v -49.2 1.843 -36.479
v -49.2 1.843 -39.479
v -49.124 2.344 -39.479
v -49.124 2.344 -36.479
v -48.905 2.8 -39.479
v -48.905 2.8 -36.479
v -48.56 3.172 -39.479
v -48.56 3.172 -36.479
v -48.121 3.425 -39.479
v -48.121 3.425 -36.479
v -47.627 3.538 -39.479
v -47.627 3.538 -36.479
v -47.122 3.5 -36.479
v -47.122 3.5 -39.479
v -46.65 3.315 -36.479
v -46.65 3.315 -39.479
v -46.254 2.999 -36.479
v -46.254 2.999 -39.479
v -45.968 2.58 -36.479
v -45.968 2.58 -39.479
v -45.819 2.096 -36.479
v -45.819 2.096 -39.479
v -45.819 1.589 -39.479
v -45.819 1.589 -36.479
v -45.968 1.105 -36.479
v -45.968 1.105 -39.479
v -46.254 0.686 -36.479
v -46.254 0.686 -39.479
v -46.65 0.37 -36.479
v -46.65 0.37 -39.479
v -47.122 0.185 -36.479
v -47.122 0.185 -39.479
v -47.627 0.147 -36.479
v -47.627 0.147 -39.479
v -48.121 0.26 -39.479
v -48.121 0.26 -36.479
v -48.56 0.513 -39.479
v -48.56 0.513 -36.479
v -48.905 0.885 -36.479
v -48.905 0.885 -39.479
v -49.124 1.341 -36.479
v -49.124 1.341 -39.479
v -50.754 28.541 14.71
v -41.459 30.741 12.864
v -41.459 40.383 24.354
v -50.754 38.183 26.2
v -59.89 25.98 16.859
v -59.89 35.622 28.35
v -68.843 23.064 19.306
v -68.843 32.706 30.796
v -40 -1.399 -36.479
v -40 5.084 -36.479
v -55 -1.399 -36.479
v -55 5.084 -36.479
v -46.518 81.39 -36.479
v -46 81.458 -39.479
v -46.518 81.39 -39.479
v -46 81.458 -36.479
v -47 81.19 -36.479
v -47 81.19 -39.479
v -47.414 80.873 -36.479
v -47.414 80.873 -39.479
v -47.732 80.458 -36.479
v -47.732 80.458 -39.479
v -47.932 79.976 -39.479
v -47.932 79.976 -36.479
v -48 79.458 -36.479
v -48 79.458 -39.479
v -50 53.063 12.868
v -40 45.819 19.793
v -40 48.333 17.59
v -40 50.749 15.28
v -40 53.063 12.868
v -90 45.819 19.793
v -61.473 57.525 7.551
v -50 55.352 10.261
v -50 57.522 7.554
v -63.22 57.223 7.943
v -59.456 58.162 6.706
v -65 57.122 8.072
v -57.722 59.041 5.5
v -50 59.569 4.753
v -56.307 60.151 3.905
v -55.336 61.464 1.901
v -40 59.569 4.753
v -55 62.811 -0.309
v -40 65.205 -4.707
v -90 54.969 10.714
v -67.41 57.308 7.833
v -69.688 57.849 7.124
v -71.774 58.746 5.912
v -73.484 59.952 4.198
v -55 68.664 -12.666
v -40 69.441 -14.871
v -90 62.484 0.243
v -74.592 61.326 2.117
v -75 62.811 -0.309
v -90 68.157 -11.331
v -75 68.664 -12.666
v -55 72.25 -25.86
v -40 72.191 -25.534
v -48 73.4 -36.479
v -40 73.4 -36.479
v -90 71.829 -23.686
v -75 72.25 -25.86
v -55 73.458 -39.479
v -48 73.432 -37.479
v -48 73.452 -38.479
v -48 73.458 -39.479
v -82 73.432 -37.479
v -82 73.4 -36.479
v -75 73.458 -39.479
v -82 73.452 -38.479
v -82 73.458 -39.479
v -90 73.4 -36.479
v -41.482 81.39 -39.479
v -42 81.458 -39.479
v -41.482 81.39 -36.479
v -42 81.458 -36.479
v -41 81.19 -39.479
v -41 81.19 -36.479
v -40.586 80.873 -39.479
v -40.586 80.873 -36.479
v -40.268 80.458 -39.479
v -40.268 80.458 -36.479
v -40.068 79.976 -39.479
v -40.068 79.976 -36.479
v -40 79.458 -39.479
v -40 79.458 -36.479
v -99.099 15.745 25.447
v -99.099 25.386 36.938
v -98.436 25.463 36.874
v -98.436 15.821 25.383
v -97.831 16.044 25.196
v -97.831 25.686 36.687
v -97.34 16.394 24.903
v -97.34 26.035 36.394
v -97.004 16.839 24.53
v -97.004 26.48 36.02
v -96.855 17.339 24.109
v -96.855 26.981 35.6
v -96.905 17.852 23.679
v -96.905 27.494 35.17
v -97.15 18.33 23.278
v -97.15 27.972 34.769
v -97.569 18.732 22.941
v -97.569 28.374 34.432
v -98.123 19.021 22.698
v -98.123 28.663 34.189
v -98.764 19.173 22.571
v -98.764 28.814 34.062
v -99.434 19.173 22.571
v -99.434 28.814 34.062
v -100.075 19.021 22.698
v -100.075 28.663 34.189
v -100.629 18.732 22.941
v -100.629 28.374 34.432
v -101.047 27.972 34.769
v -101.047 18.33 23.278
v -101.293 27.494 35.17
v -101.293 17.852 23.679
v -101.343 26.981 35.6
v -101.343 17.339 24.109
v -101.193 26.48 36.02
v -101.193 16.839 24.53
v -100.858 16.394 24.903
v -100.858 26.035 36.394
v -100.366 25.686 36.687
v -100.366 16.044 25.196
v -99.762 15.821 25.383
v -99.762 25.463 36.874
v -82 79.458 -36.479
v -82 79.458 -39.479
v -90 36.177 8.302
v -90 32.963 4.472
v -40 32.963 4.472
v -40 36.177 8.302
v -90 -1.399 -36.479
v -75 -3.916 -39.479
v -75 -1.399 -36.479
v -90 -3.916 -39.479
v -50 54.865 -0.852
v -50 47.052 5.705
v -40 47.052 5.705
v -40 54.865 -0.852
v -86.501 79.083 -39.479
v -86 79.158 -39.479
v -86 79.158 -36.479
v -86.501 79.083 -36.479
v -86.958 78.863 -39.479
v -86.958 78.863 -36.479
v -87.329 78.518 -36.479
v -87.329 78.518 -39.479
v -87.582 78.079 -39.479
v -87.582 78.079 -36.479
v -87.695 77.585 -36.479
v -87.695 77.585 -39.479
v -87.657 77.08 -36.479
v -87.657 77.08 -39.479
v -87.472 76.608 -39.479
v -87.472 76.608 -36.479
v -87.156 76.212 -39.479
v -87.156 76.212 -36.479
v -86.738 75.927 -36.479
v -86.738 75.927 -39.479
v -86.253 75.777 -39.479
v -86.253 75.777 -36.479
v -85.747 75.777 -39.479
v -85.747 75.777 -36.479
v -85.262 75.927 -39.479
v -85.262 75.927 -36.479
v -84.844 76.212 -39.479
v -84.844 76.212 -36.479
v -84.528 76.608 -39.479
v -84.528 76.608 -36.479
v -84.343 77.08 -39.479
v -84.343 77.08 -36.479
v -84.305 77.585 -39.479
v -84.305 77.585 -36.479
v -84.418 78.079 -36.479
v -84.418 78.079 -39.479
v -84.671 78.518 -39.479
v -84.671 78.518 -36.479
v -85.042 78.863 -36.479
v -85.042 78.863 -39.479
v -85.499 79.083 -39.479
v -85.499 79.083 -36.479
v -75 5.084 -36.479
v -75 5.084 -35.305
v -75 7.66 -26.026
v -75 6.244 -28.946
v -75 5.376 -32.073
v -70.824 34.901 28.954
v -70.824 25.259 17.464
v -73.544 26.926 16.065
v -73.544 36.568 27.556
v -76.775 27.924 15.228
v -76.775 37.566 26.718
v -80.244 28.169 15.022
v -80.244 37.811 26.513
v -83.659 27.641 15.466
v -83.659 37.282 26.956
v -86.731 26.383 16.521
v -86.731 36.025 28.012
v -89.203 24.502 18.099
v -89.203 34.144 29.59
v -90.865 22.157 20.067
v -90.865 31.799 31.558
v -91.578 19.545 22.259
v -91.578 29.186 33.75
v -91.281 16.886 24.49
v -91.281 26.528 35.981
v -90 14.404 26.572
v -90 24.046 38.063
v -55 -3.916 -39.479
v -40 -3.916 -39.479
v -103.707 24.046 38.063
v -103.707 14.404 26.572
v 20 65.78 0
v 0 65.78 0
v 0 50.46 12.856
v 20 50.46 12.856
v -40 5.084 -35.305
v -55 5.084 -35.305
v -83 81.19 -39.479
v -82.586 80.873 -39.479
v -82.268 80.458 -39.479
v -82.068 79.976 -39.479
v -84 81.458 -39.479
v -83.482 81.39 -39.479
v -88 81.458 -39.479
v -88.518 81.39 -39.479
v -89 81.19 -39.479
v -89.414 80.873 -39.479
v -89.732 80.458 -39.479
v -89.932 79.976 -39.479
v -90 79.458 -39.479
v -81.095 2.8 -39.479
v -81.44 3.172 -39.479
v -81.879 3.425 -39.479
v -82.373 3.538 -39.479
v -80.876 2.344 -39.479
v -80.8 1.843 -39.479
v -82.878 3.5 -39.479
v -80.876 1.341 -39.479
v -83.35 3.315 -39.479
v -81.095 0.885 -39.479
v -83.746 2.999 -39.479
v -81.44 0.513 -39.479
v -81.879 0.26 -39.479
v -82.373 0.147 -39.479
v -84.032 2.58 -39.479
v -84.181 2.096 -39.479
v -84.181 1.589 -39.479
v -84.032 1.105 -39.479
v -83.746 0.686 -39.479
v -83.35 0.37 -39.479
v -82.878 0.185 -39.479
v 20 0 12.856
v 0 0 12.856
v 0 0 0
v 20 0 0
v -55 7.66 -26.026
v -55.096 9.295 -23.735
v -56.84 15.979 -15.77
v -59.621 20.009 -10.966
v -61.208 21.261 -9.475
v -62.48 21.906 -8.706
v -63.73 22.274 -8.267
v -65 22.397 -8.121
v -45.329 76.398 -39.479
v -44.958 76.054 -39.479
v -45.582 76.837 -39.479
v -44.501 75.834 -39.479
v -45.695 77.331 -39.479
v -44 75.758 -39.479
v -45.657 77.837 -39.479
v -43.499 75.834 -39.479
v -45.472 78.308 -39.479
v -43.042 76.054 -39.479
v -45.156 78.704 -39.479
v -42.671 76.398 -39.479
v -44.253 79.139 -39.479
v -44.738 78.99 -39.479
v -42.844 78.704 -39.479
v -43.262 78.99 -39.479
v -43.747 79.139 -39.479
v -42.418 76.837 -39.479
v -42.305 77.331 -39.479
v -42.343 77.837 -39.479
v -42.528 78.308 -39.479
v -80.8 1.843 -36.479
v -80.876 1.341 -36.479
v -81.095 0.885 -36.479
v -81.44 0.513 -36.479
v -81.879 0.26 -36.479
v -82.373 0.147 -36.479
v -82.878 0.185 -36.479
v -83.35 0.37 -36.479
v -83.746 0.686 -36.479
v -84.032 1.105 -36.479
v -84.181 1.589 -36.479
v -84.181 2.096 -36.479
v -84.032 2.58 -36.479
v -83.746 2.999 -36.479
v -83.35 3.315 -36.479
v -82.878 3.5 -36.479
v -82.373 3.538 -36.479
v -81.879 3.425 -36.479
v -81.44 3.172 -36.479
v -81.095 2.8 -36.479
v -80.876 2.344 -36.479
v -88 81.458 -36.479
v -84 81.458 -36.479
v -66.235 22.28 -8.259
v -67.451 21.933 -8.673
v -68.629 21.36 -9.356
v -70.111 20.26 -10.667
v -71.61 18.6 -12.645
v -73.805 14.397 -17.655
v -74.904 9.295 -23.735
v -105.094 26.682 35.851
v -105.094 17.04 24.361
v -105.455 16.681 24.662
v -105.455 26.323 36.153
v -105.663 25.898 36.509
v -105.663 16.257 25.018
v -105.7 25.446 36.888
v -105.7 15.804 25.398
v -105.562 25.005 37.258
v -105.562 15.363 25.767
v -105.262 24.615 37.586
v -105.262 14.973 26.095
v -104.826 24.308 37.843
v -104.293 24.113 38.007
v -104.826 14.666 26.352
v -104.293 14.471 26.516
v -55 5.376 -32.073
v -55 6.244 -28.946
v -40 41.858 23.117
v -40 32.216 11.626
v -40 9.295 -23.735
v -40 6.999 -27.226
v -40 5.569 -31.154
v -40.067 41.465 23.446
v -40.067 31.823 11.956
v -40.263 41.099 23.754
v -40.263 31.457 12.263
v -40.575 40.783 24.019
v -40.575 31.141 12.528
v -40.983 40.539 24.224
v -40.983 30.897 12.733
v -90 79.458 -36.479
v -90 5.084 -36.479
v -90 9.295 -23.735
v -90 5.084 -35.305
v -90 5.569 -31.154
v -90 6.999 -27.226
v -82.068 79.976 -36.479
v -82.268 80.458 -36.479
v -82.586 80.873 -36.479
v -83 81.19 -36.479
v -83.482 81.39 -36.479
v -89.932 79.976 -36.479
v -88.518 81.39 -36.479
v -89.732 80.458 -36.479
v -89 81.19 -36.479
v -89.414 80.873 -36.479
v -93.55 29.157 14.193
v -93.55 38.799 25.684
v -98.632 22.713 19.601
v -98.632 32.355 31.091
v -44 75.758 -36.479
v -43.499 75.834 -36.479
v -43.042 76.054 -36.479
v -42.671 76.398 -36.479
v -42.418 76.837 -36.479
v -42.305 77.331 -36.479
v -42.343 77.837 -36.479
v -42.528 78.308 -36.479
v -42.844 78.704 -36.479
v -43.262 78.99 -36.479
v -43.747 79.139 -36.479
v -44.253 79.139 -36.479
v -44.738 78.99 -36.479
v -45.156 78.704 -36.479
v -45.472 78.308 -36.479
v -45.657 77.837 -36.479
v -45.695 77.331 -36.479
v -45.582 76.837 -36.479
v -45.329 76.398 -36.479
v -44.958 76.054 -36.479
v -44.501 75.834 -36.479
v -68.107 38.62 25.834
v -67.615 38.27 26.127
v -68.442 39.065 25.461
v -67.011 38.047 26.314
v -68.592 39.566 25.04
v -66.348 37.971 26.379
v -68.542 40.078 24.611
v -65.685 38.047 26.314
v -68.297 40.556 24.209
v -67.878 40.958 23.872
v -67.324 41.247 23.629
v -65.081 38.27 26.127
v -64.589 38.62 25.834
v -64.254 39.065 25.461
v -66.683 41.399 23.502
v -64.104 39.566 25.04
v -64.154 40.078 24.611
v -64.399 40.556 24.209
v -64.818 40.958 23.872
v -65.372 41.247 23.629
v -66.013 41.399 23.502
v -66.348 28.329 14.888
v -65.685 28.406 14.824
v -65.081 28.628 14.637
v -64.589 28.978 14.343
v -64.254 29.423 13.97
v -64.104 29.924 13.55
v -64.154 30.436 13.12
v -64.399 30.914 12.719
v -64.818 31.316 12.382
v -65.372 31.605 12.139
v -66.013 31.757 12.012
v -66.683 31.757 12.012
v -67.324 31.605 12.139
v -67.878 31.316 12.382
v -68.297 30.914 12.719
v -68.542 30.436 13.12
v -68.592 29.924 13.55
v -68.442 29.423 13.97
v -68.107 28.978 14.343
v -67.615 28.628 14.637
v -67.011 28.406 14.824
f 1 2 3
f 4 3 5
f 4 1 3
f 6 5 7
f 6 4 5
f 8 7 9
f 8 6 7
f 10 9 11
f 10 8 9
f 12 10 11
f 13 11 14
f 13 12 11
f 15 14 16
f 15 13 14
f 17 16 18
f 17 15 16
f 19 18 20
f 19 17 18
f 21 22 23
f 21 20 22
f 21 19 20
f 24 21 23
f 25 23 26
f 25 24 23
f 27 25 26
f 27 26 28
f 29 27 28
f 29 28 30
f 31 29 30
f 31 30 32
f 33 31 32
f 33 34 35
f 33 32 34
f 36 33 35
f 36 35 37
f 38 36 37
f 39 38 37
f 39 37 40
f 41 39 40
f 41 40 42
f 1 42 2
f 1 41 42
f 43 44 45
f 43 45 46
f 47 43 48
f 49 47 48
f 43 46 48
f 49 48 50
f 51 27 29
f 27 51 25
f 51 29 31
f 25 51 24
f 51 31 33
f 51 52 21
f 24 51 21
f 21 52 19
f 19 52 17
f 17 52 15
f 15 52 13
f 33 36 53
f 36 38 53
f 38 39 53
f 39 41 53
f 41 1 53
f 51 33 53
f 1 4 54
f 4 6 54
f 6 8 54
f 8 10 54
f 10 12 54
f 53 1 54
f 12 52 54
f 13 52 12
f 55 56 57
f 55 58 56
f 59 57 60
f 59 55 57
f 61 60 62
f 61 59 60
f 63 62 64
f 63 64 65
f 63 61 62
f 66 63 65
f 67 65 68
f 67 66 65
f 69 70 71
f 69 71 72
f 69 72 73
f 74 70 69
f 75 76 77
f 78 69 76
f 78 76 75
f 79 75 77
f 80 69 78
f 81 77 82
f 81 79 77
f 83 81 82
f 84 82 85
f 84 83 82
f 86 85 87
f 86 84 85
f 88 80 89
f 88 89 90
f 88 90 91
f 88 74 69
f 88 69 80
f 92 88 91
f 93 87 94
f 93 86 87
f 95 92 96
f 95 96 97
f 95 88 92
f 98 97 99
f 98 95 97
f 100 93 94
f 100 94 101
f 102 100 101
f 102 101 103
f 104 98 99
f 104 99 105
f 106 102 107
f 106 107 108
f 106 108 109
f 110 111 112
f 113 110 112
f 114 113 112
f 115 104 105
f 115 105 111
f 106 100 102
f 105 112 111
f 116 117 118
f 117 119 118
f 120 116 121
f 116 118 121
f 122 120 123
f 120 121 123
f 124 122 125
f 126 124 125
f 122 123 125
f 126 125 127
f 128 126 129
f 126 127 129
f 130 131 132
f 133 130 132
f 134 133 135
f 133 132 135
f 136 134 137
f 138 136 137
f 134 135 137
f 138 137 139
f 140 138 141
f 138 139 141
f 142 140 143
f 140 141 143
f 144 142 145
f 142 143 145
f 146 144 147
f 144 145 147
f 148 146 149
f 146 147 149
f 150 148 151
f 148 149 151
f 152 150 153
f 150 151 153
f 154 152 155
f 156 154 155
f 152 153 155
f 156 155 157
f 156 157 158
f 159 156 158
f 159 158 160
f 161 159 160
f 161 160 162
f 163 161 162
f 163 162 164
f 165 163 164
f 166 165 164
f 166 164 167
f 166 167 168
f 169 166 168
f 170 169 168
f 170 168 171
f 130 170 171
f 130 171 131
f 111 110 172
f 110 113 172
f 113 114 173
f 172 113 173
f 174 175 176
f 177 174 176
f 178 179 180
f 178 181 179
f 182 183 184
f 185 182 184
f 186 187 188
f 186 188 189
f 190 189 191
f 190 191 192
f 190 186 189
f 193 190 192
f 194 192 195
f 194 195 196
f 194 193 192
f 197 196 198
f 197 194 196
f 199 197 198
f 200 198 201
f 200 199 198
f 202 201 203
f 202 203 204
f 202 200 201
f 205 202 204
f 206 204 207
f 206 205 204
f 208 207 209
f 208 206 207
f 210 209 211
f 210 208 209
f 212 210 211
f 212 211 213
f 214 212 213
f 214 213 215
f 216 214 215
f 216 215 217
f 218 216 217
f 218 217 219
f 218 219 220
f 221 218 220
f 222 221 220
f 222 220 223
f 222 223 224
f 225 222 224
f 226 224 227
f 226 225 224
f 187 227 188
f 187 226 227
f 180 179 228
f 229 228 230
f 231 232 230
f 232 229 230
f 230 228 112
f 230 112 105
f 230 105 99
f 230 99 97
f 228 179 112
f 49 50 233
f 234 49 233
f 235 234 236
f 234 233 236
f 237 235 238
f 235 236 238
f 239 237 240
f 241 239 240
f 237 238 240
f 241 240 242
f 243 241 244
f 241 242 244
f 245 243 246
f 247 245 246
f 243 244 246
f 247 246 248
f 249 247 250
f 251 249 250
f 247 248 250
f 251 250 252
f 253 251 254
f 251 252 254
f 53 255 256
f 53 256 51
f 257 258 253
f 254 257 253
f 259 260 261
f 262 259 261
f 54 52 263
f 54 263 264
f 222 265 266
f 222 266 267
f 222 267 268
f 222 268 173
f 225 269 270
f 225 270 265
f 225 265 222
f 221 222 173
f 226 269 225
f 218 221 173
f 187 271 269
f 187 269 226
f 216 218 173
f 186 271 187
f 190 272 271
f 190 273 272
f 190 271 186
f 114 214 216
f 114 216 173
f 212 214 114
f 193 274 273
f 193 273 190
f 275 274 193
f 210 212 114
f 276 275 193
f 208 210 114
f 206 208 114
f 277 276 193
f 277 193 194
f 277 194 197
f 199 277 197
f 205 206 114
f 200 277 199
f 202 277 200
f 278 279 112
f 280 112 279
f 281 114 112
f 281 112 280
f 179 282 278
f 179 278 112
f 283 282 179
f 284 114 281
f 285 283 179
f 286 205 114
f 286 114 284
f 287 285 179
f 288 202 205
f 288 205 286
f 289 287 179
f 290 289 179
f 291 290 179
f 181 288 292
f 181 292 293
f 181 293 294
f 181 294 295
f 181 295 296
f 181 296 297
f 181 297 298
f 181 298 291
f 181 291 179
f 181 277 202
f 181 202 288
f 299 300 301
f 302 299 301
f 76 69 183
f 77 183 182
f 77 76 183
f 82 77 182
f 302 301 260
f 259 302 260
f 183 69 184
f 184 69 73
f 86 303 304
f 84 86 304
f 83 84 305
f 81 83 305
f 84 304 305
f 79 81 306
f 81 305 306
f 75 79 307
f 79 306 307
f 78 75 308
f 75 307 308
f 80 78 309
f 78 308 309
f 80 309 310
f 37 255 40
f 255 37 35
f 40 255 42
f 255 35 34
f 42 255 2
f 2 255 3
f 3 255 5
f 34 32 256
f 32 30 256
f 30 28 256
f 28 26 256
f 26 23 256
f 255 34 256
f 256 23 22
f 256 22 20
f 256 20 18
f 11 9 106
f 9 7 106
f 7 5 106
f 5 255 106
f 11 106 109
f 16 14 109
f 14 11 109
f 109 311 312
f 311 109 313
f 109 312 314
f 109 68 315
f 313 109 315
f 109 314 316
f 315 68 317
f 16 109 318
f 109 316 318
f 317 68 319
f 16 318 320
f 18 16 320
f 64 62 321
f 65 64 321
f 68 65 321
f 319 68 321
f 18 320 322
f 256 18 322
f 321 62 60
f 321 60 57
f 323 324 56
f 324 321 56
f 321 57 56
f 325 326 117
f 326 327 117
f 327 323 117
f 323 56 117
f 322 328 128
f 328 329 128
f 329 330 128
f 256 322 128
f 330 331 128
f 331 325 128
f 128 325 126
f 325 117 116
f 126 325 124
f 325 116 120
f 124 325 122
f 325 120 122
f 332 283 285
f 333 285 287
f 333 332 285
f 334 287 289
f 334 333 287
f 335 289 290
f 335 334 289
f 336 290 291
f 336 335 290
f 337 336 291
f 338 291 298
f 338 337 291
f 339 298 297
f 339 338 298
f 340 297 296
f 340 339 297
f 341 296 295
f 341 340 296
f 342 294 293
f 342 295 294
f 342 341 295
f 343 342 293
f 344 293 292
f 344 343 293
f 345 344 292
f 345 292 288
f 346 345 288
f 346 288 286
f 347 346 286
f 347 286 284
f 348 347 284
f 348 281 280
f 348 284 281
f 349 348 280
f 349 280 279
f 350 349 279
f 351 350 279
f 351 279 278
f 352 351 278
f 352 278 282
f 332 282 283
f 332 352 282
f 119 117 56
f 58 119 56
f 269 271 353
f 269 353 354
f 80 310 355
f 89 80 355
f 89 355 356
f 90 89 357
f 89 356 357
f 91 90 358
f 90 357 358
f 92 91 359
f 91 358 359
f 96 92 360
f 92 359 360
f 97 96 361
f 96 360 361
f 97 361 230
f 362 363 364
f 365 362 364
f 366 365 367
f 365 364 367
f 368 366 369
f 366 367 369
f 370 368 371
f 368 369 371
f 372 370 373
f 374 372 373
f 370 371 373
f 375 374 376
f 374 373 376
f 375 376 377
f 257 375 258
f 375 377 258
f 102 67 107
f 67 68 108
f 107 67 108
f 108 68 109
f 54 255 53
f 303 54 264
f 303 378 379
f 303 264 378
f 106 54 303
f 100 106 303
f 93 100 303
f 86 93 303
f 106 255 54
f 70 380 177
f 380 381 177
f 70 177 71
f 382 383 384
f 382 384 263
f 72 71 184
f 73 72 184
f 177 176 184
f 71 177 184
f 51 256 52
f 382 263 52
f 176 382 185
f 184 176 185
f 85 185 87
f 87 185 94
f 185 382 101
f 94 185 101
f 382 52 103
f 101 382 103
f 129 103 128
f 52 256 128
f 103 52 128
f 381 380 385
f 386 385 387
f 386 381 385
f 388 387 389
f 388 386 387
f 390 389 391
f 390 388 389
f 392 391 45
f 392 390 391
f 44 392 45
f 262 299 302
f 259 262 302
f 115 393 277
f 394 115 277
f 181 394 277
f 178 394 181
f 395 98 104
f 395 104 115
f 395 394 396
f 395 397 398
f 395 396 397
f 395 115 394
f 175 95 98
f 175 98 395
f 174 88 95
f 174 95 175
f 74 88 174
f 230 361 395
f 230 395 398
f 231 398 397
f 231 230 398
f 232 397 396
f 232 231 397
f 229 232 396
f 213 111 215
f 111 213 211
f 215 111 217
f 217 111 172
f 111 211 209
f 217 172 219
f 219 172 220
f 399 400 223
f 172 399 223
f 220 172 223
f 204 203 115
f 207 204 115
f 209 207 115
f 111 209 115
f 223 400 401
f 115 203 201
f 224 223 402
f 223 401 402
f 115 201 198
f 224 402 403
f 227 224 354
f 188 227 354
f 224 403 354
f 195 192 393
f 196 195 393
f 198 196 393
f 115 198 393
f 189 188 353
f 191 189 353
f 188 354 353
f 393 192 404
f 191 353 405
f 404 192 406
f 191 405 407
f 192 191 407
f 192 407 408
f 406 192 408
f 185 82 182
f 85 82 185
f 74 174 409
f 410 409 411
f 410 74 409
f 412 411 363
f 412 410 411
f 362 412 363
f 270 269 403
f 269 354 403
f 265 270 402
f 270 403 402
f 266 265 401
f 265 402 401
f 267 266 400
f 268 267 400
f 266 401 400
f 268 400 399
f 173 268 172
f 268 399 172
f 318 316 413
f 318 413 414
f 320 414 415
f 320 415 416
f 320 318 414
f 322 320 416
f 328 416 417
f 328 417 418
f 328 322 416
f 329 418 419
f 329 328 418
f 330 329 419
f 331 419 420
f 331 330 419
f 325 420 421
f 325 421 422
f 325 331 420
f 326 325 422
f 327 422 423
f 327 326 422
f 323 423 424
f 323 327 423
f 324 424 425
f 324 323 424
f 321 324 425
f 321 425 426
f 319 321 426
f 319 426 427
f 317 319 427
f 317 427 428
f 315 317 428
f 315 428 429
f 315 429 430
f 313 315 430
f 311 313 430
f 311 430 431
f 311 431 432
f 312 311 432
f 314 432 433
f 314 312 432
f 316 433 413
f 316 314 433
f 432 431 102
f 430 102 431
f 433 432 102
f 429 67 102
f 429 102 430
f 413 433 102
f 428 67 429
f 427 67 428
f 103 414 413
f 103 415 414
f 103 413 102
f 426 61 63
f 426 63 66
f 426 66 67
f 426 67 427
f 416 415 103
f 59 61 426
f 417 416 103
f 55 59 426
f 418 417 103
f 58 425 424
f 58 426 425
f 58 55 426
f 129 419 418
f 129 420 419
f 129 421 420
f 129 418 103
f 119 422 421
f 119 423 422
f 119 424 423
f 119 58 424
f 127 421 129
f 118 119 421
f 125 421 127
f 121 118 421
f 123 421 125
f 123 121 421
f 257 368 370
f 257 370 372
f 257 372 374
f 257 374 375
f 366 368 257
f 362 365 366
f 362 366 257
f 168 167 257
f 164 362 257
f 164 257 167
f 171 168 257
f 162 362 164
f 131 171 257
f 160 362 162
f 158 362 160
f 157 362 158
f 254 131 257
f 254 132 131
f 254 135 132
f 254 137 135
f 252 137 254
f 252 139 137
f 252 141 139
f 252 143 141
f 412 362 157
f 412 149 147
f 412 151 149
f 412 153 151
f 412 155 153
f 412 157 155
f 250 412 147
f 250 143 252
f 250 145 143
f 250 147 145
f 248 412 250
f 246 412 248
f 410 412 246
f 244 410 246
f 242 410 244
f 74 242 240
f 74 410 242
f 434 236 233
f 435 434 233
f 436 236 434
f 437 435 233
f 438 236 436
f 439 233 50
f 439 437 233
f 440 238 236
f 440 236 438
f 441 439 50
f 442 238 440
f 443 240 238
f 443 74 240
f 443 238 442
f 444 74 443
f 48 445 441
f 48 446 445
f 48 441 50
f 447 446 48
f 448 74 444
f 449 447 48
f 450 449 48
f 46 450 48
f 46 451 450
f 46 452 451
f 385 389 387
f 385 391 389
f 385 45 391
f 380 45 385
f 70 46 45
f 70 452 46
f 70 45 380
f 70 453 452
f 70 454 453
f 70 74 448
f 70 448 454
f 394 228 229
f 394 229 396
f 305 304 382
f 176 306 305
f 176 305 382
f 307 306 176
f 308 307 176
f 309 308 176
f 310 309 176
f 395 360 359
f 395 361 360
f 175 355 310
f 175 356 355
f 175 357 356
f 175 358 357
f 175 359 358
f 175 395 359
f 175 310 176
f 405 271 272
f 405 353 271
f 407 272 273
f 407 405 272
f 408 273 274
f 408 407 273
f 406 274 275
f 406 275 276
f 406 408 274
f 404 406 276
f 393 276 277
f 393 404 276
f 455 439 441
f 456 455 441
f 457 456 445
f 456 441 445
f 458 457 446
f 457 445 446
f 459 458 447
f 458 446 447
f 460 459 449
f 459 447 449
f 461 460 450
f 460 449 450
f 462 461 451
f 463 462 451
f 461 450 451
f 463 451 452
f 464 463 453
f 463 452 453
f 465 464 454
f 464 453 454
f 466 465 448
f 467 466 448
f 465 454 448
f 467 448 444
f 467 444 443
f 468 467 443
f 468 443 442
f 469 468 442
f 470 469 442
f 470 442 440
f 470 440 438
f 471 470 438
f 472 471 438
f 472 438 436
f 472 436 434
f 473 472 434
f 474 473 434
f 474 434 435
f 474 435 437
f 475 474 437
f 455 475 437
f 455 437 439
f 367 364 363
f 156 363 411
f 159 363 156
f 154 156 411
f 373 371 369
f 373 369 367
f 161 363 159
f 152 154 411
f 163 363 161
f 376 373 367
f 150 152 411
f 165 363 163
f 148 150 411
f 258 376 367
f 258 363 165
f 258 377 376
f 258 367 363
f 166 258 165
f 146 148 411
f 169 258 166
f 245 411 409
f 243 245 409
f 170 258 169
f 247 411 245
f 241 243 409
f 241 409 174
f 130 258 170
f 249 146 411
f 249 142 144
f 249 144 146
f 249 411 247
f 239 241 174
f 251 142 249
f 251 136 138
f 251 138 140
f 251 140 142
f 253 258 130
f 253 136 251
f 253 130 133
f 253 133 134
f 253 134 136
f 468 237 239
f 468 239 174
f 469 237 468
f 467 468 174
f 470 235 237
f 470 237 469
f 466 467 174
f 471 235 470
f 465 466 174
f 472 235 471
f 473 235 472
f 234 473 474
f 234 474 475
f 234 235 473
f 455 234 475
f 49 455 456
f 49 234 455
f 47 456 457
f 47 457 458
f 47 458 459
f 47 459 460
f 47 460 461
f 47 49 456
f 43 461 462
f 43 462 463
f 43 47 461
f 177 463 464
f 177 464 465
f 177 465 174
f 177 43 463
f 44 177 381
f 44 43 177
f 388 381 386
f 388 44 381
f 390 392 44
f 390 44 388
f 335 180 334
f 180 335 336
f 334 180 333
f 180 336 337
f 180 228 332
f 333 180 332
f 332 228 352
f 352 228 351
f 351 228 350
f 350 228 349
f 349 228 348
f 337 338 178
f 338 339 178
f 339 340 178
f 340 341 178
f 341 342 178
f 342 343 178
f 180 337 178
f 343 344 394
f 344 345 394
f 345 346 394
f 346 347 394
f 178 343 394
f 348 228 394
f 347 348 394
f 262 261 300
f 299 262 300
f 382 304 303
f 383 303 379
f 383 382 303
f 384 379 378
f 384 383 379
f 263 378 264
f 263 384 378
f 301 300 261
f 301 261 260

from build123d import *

# Parameters (mm, degrees)
AUFSATZ_LINEAR_AUSTRAGEN1_DEPTH    = 20
AUFSATZ_LINEAR_AUSTRAGEN2_DEPTH    = 20
AUFSATZ_LINEAR_AUSTRAGEN2_2_DEPTH  = 20
AUFSATZ_LINEAR_AUSTRAGEN3_DEPTH    = 50
AUFSATZ_LINEAR_AUSTRAGEN4_DEPTH    = 20
SCHNITT_LINEAR_AUSTRAGEN1_DEPTH    = 154.923378277
AUFSATZ_LINEAR_AUSTRAGEN5_DEPTH    = 50
VERRUNDUNG3_R                      = 2
SCHNITT_LINEAR_AUSTRAGEN3_DEPTH    = 5
SKIZZE12_W                         = 20
SKIZZE12_H                         = 50
SCHNITT_LINEAR_AUSTRAGEN4_DEPTH    = 163.425006425
VERRUNDUNG5_R                      = 10
VERRUNDUNG6_R                      = 10
SKIZZE13_R                         = 1.7
AUFSATZ_LINEAR_AUSTRAGEN9_DEPTH    = 3
VERRUNDUNG7_R                      = 2
VERRUNDUNG8_R                      = 2
SKIZZE14_W                         = 15
SKIZZE14_H                         = 9
SCHNITT_LINEAR_AUSTRAGEN5_DEPTH    = 156.193041065
VERRUNDUNG9_R                      = 18
SKIZZE15_R                         = 1.7
SCHNITT_LINEAR_AUSTRAGEN6_DEPTH    = 156.193041065
VERRUNDUNG10_R                     = 2
SKIZZE10_R                         = 2.25
SCHNITT_LINEAR_AUSTRAGEN2_DEPTH    = 152.160730356
SKIZZE18_W                         = 120
SKIZZE18_H                         = 10.2
SCHNITT_LINEAR_AUSTRAGEN8_DEPTH    = 10
VERRUNDUNG12_R                     = 18
VERRUNDUNG13_R                     = 2
SKIZZE16_R                         = 102.012355423
SCHNITT_LINEAR_AUSTRAGEN9_DEPTH    = 189.028945254
K_RPER_VERSCHIEBEN_KOPIEREN1_ANGLE = 90


with BuildPart() as part:
    # Skizze1 → Aufsatz-Linear austragen1 (new body)
    with BuildSketch(Plane(origin=(0, 0, 0), x_dir=(0, 0, -1), z_dir=(1, 0, 0))):
        Polygon((0, 0), (0, 65.780444431), (-12.855752194, 50.459555569), (-12.855752194, 0), align=None)
    extrude(amount=AUFSATZ_LINEAR_AUSTRAGEN1_DEPTH)


with BuildPart() as body_2:
    # Skizze2 → Aufsatz-Linear austragen2 (new body)
    with BuildSketch(Plane(origin=(0, 38.601549366, -32.390545836), x_dir=(-1, 0, 0), z_dir=(0, 0.7660444431189743, -0.6427876096865437))):
        with BuildLine():
            Line((90, 60.580920128), (90, 32.15785464))
            Line((90, 32.15785464), (40, 32.15785464))
            Line((40, 32.15785464), (40, 38.850263138))
            ThreePointArc((40, 38.850263138), (65.782949027, 47.91410669), (90, 60.580920128))
        make_face()
    extrude(amount=-AUFSATZ_LINEAR_AUSTRAGEN2_DEPTH)

    # Skizze4 → Aufsatz-Linear austragen3 (add)
    with BuildSketch(Plane.ZY.offset(90)):
        with BuildLine():
            ThreePointArc((-7.756199987, 59.272219883), (-28.145912406, 32.699829313), (-35.395290034, 0))
            Line((-35.395290034, 0), (41.979097856, 0))
            Line((41.979097856, 0), (5.099552207, 43.951331021))
            Line((5.099552207, 43.951331021), (-7.756199987, 59.272219883))
        make_face()
    extrude(amount=-AUFSATZ_LINEAR_AUSTRAGEN3_DEPTH)



with BuildPart() as body_3:
    # Skizze2 → Aufsatz-Linear austragen2 2 (new body)
    with BuildSketch(Plane(origin=(0, 38.601549366, -32.390545836), x_dir=(-1, 0, 0), z_dir=(0, 0.7660444431189743, -0.6427876096865437))):
        with BuildLine():
            Line((-110, 60.580920128), (-110, 32.15785464))
            Line((-110, 32.15785464), (-60, 32.15785464))
            Line((-60, 32.15785464), (-60, 38.850263138))
            ThreePointArc((-60, 38.850263138), (-85.782949027, 47.91410669), (-110, 60.580920128))
        make_face()
    extrude(amount=-AUFSATZ_LINEAR_AUSTRAGEN2_2_DEPTH)


with BuildPart() as body_2_1:
    add(body_2.part)

    add(body_3.part)  # Aufsatz-Linear austragen4 merges body 3
    # Skizze6 → Aufsatz-Linear austragen4 (add)
    with BuildSketch(Plane(origin=(0, 38.601549366, -32.390545836), x_dir=(1, 0, 0), z_dir=(0, 0.7660444431189745, -0.6427876096865438))):
        with BuildLine():
            ThreePointArc((-90, -32.15785464), (-97.308492273, -47.841026987), (-109.016228044, -60.580920128))
            Line((-109.016228044, -60.580920128), (-90, -60.580920128))
            Line((-90, -60.580920128), (-90, -32.15785464))
        make_face()
        with BuildLine():
            ThreePointArc((110, -32.15785464), (117.308492273, -47.841026987), (129.016228044, -60.580920128))
            Line((129.016228044, -60.580920128), (110, -60.580920128))
            Line((110, -60.580920128), (110, -32.15785464))
        make_face()
    extrude(amount=-AUFSATZ_LINEAR_AUSTRAGEN4_DEPTH)

    # Skizze5 → Schnitt-Linear austragen1 (cut, through all)
    with BuildSketch(Plane(origin=(0, 38.601549366, -32.390545836), x_dir=(1, 0, 0), z_dir=(0, 0.7660444431189745, -0.6427876096865438))):
        with BuildLine():
            ThreePointArc((-68.842783939, -49.276117645), (-85.255078401, -44.010631162), (-90, -60.580920128))
            ThreePointArc((-90, -60.580920128), (-79.599860388, -54.594510849), (-68.842783939, -49.276117645))
        make_face()
        with BuildLine():
            ThreePointArc((110, -60.580920128), (93.944642376, -65.178390536), (88.842783939, -49.276117645))
            ThreePointArc((88.842783939, -49.276117645), (105.255078401, -44.010631162), (110, -60.580920128))
        make_face()
    extrude(amount=-SCHNITT_LINEAR_AUSTRAGEN1_DEPTH, mode=Mode.SUBTRACT)

    # Skizze7 → Aufsatz-Linear austragen5 (add)
    with BuildSketch(Plane(origin=(60, 0, 0), x_dir=(0, 0, -1), z_dir=(1, 0, 0))):
        with BuildLine():
            Line((7.756199987, 59.272219883), (-41.979097856, 0))
            Line((-41.979097856, 0), (35.395290034, 0))
            ThreePointArc((35.395290034, 0), (28.145912406, 32.699829313), (7.756199987, 59.272219883))
        make_face()
    extrude(amount=AUFSATZ_LINEAR_AUSTRAGEN5_DEPTH)

    # Verrundung3
    verrundung3_edges = [body_2_1.edges().sort_by_distance(p)[0] for p in [
        (-109.016228044, 69.881769777, 20.445007484),
    ]]
    fillet(verrundung3_edges, radius=VERRUNDUNG3_R)

    # Skizze11 → Schnitt-Linear austragen3 (cut)
    with BuildSketch(Plane(origin=(0, 23.280660504, -19.534793642), x_dir=(1, 0, 0), z_dir=(0, -0.7660444431189745, 0.6427876096865438))):
        Polygon((60, 32.15785464), (110, 32.15785464), (141.028212288, 65.900023971), (38.343577108, 62.99282009), align=None)
        Polygon((-90, 32.15785464), (-40, 32.15785464), (-27.275304948, 44.003224364), (-71.113024931, 77.628353479), (-115.714952394, 75.544151261), (-104.04695397, 34.691764174), align=None)
    extrude(amount=-SCHNITT_LINEAR_AUSTRAGEN3_DEPTH, mode=Mode.SUBTRACT)

    # Skizze12 → Schnitt-Linear austragen4 (cut, through all)
    with BuildSketch(Plane(origin=(0, 16.620901993, -35.64363935), x_dir=(-1, 0, 0), z_dir=(0, 0.4226182617407026, -0.9063077870366486))):
        with Locations((65, 10.041304052)):
            Rectangle(SKIZZE12_W, SKIZZE12_H)
        with Locations((-85, 10.041304052)):
            Rectangle(SKIZZE12_W, SKIZZE12_H)
    extrude(amount=-SCHNITT_LINEAR_AUSTRAGEN4_DEPTH, mode=Mode.SUBTRACT)

    # Verrundung5
    verrundung5_edges = [body_2_1.edges().sort_by_distance(p)[0] for p in [
        (75, 39.454906174, -1.696530215),
        (95, 39.454906174, -1.696530215),
    ]]
    fillet(verrundung5_edges, radius=VERRUNDUNG5_R - 0.0001)  # a hair under: the kernel refuses the full size

    # Verrundung6
    verrundung6_edges = [body_2_1.edges().sort_by_distance(p)[0] for p in [
        (-55, 39.454906174, -1.696530215),
        (-75, 39.454906174, -1.696530215),
    ]]
    fillet(verrundung6_edges, radius=VERRUNDUNG6_R - 0.0001)  # a hair under: the kernel refuses the full size

    # Skizze13 → Aufsatz-Linear austragen9 (add)
    # profile 1 of 4: a face of its own
    with BuildSketch(Plane(origin=(0, 0, 0), x_dir=(1, 0, 0), z_dir=(0, 1, 0))):
        Polygon((-40, 35.395290034), (-40, 43.395290034), (-48, 43.395290034), (-48, 35.395290034), (-48, 33.395851283), (-40, 33.395851283), align=None)
        with Locations(Location((-44, 39.395290034, 0), (0, 0, 270))):
            Circle(SKIZZE13_R, mode=Mode.SUBTRACT)
    # profile 2 of 4: a face of its own
    with BuildSketch(Plane(origin=(0, 0, 0), x_dir=(1, 0, 0), z_dir=(0, 1, 0))):
        Polygon((-90, 43.395290034), (-82, 43.395290034), (-82, 35.395290034), (-82, 33.395851283), (-90, 33.395851283), (-90, 35.395290034), align=None)
        with Locations(Location((-86, 39.395290034, 0), (0, 0, 90))):
            Circle(SKIZZE13_R, mode=Mode.SUBTRACT)
    # profile 3 of 4: a face of its own
    with BuildSketch(Plane(origin=(0, 0, 0), x_dir=(1, 0, 0), z_dir=(0, 1, 0))):
        Polygon((68, 33.395851283), (68, 35.395290034), (68, 43.395290034), (60, 43.395290034), (60, 35.395290034), (60, 33.395851283), align=None)
        with Locations(Location((64, 39.395290034, 0), (0, 0, 90))):
            Circle(SKIZZE13_R, mode=Mode.SUBTRACT)
    # profile 4 of 4: a face of its own
    with BuildSketch(Plane(origin=(0, 0, 0), x_dir=(1, 0, 0), z_dir=(0, 1, 0))):
        Polygon((110, 33.395851283), (102, 33.395851283), (102, 35.395290034), (102, 43.395290034), (110, 43.395290034), (110, 35.395290034), align=None)
        with Locations(Location((106, 39.395290034, 0), (0, 0, 270))):
            Circle(SKIZZE13_R, mode=Mode.SUBTRACT)
    extrude(amount=AUFSATZ_LINEAR_AUSTRAGEN9_DEPTH)

    # Verrundung7
    verrundung7_edges = [body_2_1.edges().sort_by_distance(p)[0] for p in [
        (-40, 1.5, -43.395290034),
        (-48, 1.5, -43.395290034),
        (-90, 1.5, -43.395290034),
        (-82, 1.5, -43.395290034),
    ]]
    fillet(verrundung7_edges, radius=VERRUNDUNG7_R)

    # Verrundung8
    verrundung8_edges = [body_2_1.edges().sort_by_distance(p)[0] for p in [
        (60, 1.5, -43.395290034),
        (68, 1.5, -43.395290034),
        (102, 1.5, -43.395290034),
        (110, 1.5, -43.395290034),
    ]]
    fillet(verrundung8_edges, radius=VERRUNDUNG8_R)

    # Skizze14 → Schnitt-Linear austragen5 (cut, through all)
    with BuildSketch(Plane(origin=(0, 3, 0), x_dir=(-1, 0, 0), z_dir=(0, -1, 0))):
        with Locations((82.5, -37.479097856)):
            Rectangle(SKIZZE14_W, SKIZZE14_H)
        with Locations((47.5, -37.479097856)):
            Rectangle(SKIZZE14_W, SKIZZE14_H)
        with Locations((-67.5, -37.479097856)):
            Rectangle(SKIZZE14_W, SKIZZE14_H)
        with Locations((-102.5, -37.479097856)):
            Rectangle(SKIZZE14_W, SKIZZE14_H)
    extrude(amount=-SCHNITT_LINEAR_AUSTRAGEN5_DEPTH, mode=Mode.SUBTRACT)

    # Verrundung9
    verrundung9_edges = [body_2_1.edges().sort_by_distance(p)[0] for p in [
        (-47.5, 10.725782333, 32.979097856),
        (-82.5, 10.725782333, 32.979097856),
    ]]
    fillet(verrundung9_edges, radius=VERRUNDUNG9_R)

    # Skizze15 → Schnitt-Linear austragen6 (cut, through all)
    with BuildSketch(Plane(origin=(0, 3, 0), x_dir=(-1, 0, 0), z_dir=(0, -1, 0))):
        with Locations(Location((82.5, -36.22044841, 0), (0, 0, 180))):
            Circle(SKIZZE15_R)
        with Locations((47.5, -36.22044841)):
            Circle(SKIZZE15_R)
        with Locations((-102.5, -36.22044841)):
            Circle(SKIZZE15_R)
        with Locations(Location((-67.5, -36.22044841, 0), (0, 0, 180))):
            Circle(SKIZZE15_R)
    extrude(amount=SCHNITT_LINEAR_AUSTRAGEN6_DEPTH, mode=Mode.SUBTRACT)

    # Verrundung10
    verrundung10_edges = [body_2_1.edges().sort_by_distance(p)[0] for p in [
        (129.016228044, 71.796880885, 18.838038459),
        (60, 57.828683821, 2.191389427),
    ]]
    fillet(verrundung10_edges, radius=VERRUNDUNG10_R)

    # Skizze10 → Schnitt-Linear austragen2 (cut, through all)
    with BuildSketch(Plane(origin=(0, 38.601549366, -32.390545836), x_dir=(1, 0, 0), z_dir=(0, 0.7660444431189745, -0.6427876096865438))):
        with Locations(Location((119.098941858, -56.580920128, 0), (0, 0, 270))):
            Circle(SKIZZE10_R)
        with Locations(Location((86.348024598, -40.153290395, 0), (0, 0, 270))):
            Circle(SKIZZE10_R)
        with Locations(Location((-66.348024598, -40.153290395, 0), (0, 0, 270))):
            Circle(SKIZZE10_R)
        with Locations(Location((-99.098941858, -56.580920128, 0), (0, 0, 270))):
            Circle(SKIZZE10_R)
    extrude(amount=-SCHNITT_LINEAR_AUSTRAGEN2_DEPTH, mode=Mode.SUBTRACT)

    # Skizze18 → Schnitt-Linear austragen8 (cut)
    with BuildSketch(Plane(origin=(0, 38.601549366, -32.390545836), x_dir=(1, 0, 0), z_dir=(0, 0.7660444431189745, -0.6427876096865438))):
        with Locations((10, -17.05785464)):
            Rectangle(SKIZZE18_W, SKIZZE18_H)
    extrude(amount=-SCHNITT_LINEAR_AUSTRAGEN8_DEPTH, mode=Mode.SUBTRACT)

    # Verrundung12
    verrundung12_edges = [body_2_1.edges().sort_by_distance(p)[0] for p in [
        (102.5, 10.725782333, 32.979097856),
        (67.5, 10.725782333, 32.979097856),
    ]]
    fillet(verrundung12_edges, radius=VERRUNDUNG12_R)

    # Verrundung13
    verrundung13_edges = [body_2_1.edges().sort_by_distance(p)[0] for p in [
        (-40, 57.828683821, 2.191389427),
    ]]
    fillet(verrundung13_edges, radius=VERRUNDUNG13_R)

    # Skizze16 → Schnitt-Linear austragen9 (cut, through all)
    with BuildSketch(Plane(origin=(60, 0, 0), x_dir=(0, 0, -1), z_dir=(1, 0, 0))):
        with Locations((7.48825997, 22.250503314)):
            Circle(SKIZZE16_R)
    extrude(amount=SCHNITT_LINEAR_AUSTRAGEN9_DEPTH, mode=Mode.SUBTRACT)


with BuildPart() as body_2_2:
    # Körper-Verschieben/Kopieren1: moved
    add(body_2_1.part.rotate(Axis((0, 38.771107104, -0.708096089), (1, 0, 0)), K_RPER_VERSCHIEBEN_KOPIEREN1_ANGLE))


solid = Compound([part.part, body_2_2.part])
